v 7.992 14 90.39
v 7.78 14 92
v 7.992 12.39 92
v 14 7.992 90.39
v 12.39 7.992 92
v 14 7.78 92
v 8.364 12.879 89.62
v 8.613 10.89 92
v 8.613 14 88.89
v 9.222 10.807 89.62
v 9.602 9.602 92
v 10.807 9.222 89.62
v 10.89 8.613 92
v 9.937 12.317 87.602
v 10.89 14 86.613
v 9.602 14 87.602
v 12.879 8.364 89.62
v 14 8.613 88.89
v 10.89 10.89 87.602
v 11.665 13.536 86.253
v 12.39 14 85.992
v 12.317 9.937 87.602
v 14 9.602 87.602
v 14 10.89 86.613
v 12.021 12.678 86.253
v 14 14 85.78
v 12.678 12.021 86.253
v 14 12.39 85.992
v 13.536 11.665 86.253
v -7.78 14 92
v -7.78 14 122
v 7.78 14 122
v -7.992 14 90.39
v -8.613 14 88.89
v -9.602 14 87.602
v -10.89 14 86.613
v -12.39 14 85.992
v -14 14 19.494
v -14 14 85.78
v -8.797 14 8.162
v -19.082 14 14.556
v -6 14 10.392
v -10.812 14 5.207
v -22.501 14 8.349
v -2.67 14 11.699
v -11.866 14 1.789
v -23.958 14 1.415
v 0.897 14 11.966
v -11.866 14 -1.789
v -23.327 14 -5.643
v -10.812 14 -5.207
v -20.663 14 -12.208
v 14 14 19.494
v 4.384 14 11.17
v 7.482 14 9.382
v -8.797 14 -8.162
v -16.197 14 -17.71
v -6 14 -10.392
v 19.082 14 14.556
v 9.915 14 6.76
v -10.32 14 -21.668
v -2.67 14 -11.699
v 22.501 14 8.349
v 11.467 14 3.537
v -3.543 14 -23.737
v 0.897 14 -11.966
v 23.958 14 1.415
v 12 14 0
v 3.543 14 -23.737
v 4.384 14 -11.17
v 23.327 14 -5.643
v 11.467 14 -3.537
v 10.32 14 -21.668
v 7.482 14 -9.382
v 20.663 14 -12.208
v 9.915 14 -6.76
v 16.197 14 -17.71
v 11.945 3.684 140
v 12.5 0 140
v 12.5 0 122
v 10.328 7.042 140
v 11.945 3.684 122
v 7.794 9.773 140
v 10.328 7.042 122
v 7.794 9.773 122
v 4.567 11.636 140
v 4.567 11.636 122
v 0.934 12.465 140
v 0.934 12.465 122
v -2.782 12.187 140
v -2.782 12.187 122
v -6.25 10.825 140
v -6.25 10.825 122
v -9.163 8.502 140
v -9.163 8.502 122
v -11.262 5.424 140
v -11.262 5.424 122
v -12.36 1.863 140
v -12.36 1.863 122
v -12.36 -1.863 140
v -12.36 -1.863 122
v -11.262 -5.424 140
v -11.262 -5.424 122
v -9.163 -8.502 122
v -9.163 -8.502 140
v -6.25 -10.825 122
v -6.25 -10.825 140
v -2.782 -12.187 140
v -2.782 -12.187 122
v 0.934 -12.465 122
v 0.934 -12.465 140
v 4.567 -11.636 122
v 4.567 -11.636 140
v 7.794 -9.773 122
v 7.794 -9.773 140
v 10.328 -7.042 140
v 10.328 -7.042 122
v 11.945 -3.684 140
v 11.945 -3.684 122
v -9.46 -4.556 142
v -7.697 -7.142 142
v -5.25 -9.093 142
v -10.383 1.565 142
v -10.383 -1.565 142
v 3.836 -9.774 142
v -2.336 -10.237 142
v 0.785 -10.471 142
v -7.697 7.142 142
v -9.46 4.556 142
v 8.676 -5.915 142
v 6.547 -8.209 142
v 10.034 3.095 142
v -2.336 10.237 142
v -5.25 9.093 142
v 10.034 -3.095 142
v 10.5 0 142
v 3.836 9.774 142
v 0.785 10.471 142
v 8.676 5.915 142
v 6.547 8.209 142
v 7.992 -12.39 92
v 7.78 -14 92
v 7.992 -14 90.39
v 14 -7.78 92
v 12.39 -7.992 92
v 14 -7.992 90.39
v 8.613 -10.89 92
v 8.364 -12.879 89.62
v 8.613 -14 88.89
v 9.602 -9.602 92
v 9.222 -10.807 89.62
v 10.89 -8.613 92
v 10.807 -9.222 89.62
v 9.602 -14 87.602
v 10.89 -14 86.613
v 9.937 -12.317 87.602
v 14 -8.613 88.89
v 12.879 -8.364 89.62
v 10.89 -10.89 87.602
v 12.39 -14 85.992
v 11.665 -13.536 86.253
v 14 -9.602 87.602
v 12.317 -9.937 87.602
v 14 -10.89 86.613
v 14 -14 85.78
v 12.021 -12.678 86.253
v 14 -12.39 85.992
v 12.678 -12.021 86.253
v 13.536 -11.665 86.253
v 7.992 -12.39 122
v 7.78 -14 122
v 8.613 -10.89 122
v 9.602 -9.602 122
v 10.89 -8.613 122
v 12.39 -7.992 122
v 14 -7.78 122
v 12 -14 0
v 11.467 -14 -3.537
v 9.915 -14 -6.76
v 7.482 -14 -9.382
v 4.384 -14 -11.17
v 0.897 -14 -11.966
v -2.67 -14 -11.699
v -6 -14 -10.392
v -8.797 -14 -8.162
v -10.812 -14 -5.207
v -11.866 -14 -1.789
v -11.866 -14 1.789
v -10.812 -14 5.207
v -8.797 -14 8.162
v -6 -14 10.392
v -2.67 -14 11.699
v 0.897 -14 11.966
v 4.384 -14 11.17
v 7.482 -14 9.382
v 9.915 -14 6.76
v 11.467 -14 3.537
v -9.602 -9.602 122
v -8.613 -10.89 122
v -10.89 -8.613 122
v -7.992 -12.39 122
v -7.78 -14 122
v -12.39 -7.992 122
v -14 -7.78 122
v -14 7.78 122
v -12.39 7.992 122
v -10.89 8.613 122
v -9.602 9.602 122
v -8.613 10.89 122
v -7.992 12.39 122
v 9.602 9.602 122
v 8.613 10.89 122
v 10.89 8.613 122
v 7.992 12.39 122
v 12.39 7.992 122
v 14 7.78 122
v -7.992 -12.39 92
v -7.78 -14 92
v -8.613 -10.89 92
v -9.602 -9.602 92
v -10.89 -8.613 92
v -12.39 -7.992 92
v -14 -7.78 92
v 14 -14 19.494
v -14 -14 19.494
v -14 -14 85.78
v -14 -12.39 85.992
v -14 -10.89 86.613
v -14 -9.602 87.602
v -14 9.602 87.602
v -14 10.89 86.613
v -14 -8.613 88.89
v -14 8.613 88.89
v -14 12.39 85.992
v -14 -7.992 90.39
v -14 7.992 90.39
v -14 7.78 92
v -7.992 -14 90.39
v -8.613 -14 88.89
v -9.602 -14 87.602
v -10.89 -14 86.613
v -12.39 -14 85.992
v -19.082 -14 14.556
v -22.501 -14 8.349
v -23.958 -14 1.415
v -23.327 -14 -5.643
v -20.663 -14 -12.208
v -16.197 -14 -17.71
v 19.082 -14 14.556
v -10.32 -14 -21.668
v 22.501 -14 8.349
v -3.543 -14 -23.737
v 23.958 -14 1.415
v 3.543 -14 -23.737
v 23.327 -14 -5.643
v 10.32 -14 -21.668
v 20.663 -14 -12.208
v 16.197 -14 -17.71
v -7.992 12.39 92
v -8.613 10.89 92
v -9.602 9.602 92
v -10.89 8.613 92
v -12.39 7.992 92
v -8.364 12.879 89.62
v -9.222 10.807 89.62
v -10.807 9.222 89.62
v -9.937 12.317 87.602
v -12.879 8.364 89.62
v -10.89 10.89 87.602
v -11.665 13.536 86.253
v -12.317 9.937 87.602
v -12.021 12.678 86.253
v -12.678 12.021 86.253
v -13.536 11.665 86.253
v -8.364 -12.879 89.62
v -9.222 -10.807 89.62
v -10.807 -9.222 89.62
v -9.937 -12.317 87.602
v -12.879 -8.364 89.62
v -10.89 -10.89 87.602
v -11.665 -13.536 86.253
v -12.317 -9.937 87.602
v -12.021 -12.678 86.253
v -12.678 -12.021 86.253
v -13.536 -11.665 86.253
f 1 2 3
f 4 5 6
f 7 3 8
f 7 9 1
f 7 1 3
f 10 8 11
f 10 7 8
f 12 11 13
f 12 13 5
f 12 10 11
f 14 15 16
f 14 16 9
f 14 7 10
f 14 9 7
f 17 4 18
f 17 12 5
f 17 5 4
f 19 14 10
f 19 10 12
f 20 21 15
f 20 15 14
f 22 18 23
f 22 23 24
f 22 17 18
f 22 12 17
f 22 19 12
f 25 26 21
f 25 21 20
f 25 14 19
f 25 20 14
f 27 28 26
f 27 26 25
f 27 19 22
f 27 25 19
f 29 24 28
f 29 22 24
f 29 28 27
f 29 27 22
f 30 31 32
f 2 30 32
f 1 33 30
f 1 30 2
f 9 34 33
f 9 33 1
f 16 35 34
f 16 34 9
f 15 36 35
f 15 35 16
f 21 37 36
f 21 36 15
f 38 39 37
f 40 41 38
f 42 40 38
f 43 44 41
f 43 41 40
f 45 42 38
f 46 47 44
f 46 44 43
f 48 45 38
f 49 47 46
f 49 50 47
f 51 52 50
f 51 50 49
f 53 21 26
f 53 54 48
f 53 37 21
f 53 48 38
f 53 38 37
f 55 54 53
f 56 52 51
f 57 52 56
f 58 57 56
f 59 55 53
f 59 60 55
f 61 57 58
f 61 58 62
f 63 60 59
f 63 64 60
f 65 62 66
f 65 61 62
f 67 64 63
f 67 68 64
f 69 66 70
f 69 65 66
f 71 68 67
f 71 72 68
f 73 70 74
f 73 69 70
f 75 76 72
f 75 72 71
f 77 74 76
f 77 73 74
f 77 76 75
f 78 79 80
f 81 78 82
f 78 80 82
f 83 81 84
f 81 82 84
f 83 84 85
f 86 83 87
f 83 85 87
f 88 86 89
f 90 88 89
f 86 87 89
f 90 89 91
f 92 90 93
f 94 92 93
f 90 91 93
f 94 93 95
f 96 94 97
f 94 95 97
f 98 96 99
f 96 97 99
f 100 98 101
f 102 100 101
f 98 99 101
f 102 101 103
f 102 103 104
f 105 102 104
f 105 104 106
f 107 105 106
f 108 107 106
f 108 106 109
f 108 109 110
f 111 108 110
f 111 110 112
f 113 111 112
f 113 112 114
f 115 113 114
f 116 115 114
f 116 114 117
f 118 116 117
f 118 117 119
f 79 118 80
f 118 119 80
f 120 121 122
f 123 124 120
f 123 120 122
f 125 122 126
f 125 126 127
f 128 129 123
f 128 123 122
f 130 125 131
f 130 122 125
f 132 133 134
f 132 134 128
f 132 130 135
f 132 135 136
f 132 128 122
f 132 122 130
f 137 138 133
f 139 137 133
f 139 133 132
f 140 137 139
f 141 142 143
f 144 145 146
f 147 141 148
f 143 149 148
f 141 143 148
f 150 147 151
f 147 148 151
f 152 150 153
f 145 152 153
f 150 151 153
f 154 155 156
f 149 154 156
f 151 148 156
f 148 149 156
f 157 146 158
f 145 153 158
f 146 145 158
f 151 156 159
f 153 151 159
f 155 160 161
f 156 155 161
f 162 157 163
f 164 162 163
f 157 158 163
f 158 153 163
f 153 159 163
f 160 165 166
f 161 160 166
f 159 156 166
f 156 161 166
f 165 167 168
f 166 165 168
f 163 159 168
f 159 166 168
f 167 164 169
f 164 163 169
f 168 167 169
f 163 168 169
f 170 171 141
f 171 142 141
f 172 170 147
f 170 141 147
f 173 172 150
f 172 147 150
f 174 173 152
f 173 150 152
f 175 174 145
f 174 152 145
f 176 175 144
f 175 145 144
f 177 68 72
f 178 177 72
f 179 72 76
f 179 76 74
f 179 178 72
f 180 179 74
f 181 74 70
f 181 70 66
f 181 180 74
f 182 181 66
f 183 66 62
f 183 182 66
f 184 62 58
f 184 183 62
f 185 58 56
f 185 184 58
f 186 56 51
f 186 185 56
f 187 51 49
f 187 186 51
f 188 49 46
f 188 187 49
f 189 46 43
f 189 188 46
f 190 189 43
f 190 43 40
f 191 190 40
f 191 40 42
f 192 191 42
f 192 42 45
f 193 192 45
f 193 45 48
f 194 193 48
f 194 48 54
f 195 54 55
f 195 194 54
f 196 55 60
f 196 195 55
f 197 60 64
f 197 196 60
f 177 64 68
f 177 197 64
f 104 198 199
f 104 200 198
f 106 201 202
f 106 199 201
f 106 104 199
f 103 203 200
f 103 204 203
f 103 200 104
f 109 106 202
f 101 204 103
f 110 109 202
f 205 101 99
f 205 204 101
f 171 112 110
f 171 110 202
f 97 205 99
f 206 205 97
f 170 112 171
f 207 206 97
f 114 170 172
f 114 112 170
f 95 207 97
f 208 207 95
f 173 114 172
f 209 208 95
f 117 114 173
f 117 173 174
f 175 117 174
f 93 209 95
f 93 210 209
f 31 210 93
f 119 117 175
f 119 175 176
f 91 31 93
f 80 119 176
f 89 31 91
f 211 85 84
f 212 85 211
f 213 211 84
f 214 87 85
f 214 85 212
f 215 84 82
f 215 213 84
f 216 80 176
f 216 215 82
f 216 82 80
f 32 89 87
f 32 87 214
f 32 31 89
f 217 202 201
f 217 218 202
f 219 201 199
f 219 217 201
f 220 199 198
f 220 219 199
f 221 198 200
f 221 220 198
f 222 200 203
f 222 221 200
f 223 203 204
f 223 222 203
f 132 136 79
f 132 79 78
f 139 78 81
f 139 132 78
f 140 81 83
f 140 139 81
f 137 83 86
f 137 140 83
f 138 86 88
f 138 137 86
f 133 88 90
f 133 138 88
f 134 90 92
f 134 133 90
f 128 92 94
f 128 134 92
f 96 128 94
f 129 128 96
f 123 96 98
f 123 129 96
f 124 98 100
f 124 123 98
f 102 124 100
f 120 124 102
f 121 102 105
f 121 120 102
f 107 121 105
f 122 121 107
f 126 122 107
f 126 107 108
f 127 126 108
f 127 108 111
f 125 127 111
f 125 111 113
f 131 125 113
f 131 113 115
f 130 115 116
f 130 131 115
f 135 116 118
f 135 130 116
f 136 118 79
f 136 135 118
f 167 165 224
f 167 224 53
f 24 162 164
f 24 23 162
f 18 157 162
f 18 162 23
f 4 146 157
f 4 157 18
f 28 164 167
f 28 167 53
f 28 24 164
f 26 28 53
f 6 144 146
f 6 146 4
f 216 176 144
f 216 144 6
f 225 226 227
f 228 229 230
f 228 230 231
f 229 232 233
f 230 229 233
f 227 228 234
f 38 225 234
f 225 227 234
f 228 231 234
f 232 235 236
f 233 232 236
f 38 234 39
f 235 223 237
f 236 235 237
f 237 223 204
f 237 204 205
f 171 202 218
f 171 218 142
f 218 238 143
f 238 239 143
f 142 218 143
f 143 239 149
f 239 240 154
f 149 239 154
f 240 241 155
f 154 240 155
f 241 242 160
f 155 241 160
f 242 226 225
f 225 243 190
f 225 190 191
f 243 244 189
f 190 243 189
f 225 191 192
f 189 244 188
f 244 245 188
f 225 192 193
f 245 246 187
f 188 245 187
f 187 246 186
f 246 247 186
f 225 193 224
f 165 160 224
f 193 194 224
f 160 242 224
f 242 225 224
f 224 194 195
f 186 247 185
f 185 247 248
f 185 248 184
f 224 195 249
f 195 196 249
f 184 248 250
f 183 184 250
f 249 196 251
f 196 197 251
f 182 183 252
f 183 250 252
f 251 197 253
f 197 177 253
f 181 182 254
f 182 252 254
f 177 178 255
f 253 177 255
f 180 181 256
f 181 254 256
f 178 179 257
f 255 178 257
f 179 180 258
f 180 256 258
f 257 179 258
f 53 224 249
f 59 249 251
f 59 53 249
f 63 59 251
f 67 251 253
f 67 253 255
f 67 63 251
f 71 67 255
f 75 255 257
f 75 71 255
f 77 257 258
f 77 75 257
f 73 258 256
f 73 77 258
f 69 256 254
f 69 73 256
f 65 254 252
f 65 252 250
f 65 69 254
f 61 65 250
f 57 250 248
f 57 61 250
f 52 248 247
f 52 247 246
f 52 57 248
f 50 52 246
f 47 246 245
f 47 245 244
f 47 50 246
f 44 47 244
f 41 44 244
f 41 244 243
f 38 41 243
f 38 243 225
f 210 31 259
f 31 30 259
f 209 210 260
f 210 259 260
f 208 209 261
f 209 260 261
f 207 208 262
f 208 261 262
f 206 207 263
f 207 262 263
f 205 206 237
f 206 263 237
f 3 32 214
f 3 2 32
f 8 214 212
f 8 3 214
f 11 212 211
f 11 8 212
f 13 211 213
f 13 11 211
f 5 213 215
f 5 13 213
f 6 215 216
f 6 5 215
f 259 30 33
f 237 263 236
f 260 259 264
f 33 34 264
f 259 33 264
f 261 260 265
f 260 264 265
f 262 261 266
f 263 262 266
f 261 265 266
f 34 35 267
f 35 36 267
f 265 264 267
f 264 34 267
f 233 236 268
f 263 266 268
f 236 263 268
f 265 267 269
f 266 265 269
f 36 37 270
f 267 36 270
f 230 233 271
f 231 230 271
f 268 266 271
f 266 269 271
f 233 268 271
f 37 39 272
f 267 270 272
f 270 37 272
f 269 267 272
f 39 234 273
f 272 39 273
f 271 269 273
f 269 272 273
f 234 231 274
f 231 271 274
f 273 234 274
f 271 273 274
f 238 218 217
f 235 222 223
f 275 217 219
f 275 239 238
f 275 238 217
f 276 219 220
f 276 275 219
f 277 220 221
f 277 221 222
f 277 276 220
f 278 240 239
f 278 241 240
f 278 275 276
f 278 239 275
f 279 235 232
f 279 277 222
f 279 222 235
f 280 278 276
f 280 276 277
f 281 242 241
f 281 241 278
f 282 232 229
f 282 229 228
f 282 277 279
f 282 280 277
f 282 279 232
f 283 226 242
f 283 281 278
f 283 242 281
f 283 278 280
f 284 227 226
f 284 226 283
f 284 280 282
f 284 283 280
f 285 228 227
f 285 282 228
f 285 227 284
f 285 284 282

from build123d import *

# Parameters (mm, degrees)
SKETCH1_R           = 24
SKETCH1_R_2         = 12
BOSS_EXTRUDE1_DEPTH = 14
BOSS_EXTRUDE2_REACH = 148
SKETCH2_W           = 28
SKETCH2_H           = 28
SKETCH4_R           = 12.5
BOSS_EXTRUDE3_DEPTH = 20
CHAMFER1_SIZE       = 2


with BuildPart() as part:
    # Sketch1 → Boss-Extrude1 (new body, symmetric)
    with BuildSketch(Plane(origin=(0, 0, 0), x_dir=(1, 0, 0), z_dir=(0, 1, 0))):
        Circle(SKETCH1_R)
        Circle(SKETCH1_R_2, mode=Mode.SUBTRACT)
    extrude(amount=BOSS_EXTRUDE1_DEPTH, both=True)

    # Sketch2 → Boss-Extrude2 (add, up to next)
    with BuildSketch(Plane.XY.offset(122), mode=Mode.PRIVATE) as boss_extrude2_sk1:
        Rectangle(SKETCH2_W, SKETCH2_H)
    boss_extrude2_tool1 = extrude(boss_extrude2_sk1.sketch, amount=-BOSS_EXTRUDE2_REACH, mode=Mode.PRIVATE) - part.part
    add(boss_extrude2_tool1.solids().sort_by_distance((0, 0, 122))[0])

    # Sketch3 → Cut-Revolve1 (revolve, cut)
    with BuildSketch(Plane(origin=(14, 0, 0), x_dir=(0, 0, -1), z_dir=(1, 0, 0))):
        with BuildLine():
            Line((-122, 14), (-122, 7.78))
            Line((-122, 7.78), (-92, 7.78))
            ThreePointArc((-92, 7.78), (-87.601795821, 9.601795821), (-85.78, 14))
            Line((-85.78, 14), (-122, 14))
        make_face()
    cut_revolve1 = revolve(axis=Axis((14, 14, -500000), (0, 0, 1)), mode=Mode.SUBTRACT)

    # Mirror1: Cut-Revolve1 across plane
    add(cut_revolve1.mirror(Plane(origin=(0, 0, 0), x_dir=(0, 0, 1), z_dir=(1, 0, 0))), mode=Mode.SUBTRACT)

    # Mirror2: Cut-Revolve1 across plane
    add(cut_revolve1.mirror(Plane.ZX), mode=Mode.SUBTRACT)

    # Mirror2 copy 1 sketch → Mirror2 copy 1 (revolve, cut)
    with BuildSketch(Plane(origin=(-14, 0, 0), x_dir=(0, 0, -1), z_dir=(-1, 0, 0))):
        with BuildLine():
            Line((-122, 14), (-122, 7.78))
            Line((-122, 7.78), (-92, 7.78))
            ThreePointArc((-92, 7.78), (-87.601795821, 9.601795821), (-85.78, 14))
            Line((-85.78, 14), (-122, 14))
        make_face()
    revolve(axis=Axis((-14, -14, -500000), (0, 0, 1)), mode=Mode.SUBTRACT)

    # Sketch4 → Boss-Extrude3 (add)
    with BuildSketch(Plane.XY.offset(122)):
        Circle(SKETCH4_R)
    extrude(amount=BOSS_EXTRUDE3_DEPTH)

    # Chamfer1
    chamfer1_edges = [part.edges().sort_by_distance(p)[0] for p in [
        (-12.5, 0, 142),
    ]]
    chamfer(chamfer1_edges, length=CHAMFER1_SIZE)


solid = part.part
